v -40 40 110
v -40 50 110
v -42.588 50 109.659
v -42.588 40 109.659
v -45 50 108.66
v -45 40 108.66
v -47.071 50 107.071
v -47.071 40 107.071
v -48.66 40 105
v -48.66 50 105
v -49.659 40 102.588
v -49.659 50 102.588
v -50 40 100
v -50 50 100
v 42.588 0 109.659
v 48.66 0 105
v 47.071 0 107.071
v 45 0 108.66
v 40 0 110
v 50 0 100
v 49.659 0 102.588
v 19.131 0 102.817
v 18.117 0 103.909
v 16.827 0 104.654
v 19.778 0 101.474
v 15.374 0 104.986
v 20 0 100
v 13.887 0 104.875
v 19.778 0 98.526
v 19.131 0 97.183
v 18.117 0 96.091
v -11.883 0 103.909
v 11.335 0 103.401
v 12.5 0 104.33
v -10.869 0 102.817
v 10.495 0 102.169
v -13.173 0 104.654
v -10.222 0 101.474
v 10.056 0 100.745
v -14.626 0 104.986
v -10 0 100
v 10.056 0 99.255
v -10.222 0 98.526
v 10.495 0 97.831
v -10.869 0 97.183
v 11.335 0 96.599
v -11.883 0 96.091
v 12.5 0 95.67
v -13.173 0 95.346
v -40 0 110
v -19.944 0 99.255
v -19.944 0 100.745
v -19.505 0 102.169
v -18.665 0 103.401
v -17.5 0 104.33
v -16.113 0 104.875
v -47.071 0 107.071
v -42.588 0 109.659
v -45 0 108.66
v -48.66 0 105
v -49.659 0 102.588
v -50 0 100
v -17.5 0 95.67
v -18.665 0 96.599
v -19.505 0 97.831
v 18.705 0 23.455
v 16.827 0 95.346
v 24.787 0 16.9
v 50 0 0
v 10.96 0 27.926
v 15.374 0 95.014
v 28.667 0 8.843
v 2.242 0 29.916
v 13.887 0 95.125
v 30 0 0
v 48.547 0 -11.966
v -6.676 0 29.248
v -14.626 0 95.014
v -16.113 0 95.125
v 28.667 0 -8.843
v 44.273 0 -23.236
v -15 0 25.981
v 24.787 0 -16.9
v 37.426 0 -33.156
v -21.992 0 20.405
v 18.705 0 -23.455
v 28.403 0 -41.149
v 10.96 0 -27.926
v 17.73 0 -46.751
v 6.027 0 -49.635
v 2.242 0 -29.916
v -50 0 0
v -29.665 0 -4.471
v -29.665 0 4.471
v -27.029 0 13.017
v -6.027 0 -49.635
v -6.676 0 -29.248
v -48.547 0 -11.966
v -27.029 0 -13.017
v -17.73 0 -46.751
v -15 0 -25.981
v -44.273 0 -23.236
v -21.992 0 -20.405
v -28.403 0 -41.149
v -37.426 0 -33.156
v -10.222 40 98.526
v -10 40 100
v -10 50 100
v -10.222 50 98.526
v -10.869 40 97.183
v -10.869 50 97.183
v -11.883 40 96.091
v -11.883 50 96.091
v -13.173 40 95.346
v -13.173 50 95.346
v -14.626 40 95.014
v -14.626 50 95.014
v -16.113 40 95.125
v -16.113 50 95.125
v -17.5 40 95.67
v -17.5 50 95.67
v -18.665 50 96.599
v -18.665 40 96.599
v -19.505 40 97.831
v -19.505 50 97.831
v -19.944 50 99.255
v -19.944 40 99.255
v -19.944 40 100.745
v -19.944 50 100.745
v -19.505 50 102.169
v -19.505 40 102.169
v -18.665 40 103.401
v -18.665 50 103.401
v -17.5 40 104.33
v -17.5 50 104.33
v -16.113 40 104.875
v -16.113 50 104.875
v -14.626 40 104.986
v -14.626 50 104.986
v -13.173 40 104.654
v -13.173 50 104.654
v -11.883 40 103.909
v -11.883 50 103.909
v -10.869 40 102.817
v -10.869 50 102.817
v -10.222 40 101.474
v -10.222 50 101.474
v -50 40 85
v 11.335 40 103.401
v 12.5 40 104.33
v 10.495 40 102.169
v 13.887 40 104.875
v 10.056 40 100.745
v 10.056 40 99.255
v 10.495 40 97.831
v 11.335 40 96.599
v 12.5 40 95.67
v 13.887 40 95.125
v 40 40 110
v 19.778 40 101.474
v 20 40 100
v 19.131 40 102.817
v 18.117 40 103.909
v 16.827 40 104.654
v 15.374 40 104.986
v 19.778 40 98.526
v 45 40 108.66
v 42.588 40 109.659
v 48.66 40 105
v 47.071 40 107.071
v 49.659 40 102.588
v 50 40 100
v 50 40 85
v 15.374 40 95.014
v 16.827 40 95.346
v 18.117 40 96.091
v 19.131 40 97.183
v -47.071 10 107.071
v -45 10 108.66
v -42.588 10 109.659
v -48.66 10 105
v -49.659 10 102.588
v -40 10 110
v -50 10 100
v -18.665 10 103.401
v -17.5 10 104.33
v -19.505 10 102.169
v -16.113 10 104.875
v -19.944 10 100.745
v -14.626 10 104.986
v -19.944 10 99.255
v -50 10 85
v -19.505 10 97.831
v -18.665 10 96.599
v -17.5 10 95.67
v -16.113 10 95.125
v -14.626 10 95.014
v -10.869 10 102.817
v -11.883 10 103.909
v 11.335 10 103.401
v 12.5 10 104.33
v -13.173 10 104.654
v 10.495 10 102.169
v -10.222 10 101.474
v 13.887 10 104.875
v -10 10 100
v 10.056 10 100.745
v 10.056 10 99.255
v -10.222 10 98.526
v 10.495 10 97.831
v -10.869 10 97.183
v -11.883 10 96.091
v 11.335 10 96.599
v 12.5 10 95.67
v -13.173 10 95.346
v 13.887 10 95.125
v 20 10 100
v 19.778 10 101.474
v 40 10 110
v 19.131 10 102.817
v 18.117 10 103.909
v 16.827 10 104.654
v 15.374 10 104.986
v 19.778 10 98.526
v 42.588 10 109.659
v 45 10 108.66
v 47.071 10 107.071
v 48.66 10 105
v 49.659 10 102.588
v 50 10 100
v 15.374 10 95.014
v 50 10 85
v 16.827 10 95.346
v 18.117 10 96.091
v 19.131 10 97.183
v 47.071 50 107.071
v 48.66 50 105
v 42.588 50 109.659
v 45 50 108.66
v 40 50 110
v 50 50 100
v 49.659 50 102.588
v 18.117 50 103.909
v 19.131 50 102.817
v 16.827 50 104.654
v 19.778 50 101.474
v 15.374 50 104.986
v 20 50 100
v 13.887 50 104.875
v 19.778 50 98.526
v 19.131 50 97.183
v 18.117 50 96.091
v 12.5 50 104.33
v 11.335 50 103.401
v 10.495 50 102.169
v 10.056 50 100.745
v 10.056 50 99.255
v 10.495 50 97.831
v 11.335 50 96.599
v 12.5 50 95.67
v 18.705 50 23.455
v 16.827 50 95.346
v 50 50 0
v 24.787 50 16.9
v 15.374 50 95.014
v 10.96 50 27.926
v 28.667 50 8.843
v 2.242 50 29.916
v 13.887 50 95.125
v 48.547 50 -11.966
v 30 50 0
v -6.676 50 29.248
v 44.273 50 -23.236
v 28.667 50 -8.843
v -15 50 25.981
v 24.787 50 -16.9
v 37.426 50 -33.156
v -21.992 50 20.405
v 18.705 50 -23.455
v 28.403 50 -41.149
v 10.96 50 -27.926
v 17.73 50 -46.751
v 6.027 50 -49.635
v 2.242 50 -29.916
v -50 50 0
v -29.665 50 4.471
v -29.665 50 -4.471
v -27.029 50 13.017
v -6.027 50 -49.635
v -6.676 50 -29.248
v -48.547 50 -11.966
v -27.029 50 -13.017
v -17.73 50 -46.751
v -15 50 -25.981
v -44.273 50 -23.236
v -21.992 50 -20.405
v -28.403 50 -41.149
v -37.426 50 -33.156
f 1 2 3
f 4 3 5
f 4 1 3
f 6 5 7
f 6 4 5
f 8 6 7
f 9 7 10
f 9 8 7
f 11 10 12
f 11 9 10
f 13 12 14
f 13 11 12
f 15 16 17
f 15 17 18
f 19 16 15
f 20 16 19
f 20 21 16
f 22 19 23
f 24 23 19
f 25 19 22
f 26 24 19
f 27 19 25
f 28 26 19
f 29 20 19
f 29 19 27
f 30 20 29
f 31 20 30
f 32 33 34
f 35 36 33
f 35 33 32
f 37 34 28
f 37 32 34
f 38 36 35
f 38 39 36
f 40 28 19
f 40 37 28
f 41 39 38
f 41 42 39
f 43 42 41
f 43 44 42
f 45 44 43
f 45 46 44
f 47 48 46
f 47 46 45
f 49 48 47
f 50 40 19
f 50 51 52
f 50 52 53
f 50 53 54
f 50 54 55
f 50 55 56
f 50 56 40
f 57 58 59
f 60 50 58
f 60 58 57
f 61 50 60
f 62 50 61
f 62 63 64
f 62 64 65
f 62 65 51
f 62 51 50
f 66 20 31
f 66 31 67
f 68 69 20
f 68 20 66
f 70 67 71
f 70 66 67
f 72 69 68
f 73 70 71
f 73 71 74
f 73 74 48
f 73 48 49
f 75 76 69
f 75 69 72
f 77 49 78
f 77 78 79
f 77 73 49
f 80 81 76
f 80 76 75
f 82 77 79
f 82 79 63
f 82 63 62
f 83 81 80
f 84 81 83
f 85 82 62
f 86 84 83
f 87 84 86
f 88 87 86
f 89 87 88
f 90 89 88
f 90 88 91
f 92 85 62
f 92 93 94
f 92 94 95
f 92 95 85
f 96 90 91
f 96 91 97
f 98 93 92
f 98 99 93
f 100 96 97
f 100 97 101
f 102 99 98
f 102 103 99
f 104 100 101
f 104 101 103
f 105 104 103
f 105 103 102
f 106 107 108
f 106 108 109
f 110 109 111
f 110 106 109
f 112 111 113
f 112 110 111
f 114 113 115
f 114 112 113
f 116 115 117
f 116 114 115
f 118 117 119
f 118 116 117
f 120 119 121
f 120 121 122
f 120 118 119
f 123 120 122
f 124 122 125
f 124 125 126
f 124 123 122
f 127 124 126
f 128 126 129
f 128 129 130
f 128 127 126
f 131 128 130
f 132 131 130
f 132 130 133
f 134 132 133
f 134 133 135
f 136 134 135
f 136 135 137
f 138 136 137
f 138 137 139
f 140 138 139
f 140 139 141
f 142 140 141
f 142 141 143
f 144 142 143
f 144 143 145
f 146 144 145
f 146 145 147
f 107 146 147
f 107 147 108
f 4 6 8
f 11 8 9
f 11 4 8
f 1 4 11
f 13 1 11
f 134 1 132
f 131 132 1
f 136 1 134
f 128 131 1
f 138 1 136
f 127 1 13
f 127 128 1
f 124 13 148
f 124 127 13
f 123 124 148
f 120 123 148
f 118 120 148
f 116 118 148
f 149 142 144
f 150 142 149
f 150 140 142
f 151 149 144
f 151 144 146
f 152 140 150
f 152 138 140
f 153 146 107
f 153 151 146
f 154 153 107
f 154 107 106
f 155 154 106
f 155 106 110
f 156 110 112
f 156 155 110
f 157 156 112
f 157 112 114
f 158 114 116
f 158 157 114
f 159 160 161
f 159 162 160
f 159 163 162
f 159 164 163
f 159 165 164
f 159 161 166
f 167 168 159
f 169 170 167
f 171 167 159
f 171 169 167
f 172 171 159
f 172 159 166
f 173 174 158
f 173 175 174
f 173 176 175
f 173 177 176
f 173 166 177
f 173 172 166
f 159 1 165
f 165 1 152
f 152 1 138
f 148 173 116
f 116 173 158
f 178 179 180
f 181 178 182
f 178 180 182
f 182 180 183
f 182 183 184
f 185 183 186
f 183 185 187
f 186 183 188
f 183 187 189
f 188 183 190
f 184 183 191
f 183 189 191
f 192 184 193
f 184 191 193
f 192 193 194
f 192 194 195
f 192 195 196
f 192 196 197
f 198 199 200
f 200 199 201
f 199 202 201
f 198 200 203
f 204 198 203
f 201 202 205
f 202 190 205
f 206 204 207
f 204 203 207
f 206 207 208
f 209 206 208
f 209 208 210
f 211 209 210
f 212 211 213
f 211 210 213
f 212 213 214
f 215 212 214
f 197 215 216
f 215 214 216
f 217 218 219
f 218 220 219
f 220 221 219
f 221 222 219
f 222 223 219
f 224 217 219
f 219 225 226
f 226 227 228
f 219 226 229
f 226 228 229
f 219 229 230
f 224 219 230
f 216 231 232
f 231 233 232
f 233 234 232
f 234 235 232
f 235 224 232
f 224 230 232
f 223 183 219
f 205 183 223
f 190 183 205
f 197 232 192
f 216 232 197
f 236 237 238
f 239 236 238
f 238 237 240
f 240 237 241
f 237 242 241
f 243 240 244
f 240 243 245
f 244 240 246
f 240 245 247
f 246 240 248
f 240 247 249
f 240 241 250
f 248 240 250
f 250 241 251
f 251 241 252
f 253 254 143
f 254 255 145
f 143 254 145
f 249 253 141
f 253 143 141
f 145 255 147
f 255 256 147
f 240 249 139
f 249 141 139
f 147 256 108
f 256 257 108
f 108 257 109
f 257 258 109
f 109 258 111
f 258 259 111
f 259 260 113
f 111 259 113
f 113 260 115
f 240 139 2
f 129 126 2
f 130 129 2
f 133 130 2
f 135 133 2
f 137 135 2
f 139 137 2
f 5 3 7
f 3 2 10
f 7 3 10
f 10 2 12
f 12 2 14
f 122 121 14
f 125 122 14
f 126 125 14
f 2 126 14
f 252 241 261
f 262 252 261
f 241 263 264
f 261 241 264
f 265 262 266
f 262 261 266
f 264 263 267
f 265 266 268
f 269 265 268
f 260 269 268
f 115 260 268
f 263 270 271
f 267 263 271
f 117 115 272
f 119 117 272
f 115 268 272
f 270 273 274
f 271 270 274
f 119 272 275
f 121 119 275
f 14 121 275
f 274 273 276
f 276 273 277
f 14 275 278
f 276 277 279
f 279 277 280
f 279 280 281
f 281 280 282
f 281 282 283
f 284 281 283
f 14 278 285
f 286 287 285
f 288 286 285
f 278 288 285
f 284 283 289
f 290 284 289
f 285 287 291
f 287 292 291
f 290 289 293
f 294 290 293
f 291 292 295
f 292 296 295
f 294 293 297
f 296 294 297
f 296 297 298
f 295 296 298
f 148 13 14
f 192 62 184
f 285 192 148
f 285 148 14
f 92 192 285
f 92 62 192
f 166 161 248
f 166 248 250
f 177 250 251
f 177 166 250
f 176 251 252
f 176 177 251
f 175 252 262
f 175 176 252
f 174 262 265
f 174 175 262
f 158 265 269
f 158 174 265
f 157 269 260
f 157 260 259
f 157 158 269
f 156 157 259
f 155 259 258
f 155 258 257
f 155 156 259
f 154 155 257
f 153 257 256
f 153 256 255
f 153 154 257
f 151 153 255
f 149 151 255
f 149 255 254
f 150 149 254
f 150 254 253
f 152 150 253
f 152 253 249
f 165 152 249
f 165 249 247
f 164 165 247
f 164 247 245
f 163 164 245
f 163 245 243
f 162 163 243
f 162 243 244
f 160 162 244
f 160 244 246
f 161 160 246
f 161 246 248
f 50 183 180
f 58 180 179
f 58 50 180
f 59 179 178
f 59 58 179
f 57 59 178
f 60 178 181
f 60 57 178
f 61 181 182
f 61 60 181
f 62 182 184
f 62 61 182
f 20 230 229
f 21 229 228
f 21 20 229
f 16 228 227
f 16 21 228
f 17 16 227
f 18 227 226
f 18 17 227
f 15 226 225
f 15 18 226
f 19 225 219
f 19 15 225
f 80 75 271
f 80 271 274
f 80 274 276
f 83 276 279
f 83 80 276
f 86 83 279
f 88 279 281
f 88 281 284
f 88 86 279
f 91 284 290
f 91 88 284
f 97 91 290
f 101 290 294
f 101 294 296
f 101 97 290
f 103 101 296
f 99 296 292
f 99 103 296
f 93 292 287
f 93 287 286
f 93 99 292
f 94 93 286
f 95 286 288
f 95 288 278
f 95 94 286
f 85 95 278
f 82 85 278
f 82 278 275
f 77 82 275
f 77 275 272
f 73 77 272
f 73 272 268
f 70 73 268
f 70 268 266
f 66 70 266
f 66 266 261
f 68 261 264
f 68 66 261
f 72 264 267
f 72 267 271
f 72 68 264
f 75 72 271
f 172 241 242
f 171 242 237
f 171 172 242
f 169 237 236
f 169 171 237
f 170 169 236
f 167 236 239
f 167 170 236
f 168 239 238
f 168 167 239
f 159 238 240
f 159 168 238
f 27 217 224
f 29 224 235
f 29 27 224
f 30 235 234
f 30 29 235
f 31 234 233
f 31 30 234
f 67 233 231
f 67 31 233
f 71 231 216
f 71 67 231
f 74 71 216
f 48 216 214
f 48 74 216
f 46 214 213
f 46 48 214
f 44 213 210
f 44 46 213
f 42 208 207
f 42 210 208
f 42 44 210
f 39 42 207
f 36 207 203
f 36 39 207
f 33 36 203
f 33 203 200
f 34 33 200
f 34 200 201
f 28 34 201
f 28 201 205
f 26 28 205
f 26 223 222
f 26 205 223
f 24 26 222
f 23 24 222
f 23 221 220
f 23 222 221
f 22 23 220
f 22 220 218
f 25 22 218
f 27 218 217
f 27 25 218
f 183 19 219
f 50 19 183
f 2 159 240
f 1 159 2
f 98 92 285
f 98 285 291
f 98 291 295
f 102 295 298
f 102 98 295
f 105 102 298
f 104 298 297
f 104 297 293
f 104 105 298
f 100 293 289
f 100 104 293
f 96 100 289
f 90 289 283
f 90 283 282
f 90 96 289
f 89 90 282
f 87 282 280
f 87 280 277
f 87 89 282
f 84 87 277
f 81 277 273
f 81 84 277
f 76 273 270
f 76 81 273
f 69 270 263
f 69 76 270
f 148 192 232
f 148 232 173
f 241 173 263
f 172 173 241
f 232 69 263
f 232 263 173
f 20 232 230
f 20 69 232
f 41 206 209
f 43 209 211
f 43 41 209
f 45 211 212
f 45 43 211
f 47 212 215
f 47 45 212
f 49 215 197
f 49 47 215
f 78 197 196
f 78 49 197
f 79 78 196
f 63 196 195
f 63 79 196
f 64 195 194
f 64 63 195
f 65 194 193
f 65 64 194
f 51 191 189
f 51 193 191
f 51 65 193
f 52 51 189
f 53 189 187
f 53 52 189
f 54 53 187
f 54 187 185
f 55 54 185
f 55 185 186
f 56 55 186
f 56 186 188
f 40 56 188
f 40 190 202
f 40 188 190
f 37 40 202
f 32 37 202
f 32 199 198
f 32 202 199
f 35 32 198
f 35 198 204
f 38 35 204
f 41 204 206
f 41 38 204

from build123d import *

# Parameters (mm, degrees)
SKETCH1_R           = 30
SKETCH1_R_2         = 5
BOSS_EXTRUDE1_DEPTH = 50
SKETCH2_W           = 25
SKETCH2_H           = 30
CUT_EXTRUDE1_DEPTH  = 101


with BuildPart() as part:
    # Sketch1 → Boss-Extrude1 (new body)
    with BuildSketch(Plane(origin=(0, 0, 0), x_dir=(1, 0, 0), z_dir=(0, 1, 0))):
        with BuildLine():
            Line((-50, -60), (-50, 0))
            ThreePointArc((-50, 0), (0, 50), (50, 0))
            Line((50, 0), (50, -60))
            Line((50, -60), (50, -100))
            ThreePointArc((50, -100), (47.071067812, -107.071067812), (40, -110))
            Line((40, -110), (-40, -110))
            ThreePointArc((-40, -110), (-47.071067812, -107.071067812), (-50, -100))
            Line((-50, -100), (-50, -60))
        make_face()
        Circle(SKETCH1_R, mode=Mode.SUBTRACT)
        with Locations((-15, -100)):
            Circle(SKETCH1_R_2, mode=Mode.SUBTRACT)
        with Locations((15, -100)):
            Circle(SKETCH1_R_2, mode=Mode.SUBTRACT)
    extrude(amount=BOSS_EXTRUDE1_DEPTH)

    # Sketch2 → Cut-Extrude1 (cut, through all)
    with BuildSketch(Plane(origin=(50, 0, 0), x_dir=(0, 0, -1), z_dir=(1, 0, 0))):
        with Locations((-97.5, 25)):
            Rectangle(SKETCH2_W, SKETCH2_H)
    extrude(amount=-CUT_EXTRUDE1_DEPTH, mode=Mode.SUBTRACT)


solid = part.part
